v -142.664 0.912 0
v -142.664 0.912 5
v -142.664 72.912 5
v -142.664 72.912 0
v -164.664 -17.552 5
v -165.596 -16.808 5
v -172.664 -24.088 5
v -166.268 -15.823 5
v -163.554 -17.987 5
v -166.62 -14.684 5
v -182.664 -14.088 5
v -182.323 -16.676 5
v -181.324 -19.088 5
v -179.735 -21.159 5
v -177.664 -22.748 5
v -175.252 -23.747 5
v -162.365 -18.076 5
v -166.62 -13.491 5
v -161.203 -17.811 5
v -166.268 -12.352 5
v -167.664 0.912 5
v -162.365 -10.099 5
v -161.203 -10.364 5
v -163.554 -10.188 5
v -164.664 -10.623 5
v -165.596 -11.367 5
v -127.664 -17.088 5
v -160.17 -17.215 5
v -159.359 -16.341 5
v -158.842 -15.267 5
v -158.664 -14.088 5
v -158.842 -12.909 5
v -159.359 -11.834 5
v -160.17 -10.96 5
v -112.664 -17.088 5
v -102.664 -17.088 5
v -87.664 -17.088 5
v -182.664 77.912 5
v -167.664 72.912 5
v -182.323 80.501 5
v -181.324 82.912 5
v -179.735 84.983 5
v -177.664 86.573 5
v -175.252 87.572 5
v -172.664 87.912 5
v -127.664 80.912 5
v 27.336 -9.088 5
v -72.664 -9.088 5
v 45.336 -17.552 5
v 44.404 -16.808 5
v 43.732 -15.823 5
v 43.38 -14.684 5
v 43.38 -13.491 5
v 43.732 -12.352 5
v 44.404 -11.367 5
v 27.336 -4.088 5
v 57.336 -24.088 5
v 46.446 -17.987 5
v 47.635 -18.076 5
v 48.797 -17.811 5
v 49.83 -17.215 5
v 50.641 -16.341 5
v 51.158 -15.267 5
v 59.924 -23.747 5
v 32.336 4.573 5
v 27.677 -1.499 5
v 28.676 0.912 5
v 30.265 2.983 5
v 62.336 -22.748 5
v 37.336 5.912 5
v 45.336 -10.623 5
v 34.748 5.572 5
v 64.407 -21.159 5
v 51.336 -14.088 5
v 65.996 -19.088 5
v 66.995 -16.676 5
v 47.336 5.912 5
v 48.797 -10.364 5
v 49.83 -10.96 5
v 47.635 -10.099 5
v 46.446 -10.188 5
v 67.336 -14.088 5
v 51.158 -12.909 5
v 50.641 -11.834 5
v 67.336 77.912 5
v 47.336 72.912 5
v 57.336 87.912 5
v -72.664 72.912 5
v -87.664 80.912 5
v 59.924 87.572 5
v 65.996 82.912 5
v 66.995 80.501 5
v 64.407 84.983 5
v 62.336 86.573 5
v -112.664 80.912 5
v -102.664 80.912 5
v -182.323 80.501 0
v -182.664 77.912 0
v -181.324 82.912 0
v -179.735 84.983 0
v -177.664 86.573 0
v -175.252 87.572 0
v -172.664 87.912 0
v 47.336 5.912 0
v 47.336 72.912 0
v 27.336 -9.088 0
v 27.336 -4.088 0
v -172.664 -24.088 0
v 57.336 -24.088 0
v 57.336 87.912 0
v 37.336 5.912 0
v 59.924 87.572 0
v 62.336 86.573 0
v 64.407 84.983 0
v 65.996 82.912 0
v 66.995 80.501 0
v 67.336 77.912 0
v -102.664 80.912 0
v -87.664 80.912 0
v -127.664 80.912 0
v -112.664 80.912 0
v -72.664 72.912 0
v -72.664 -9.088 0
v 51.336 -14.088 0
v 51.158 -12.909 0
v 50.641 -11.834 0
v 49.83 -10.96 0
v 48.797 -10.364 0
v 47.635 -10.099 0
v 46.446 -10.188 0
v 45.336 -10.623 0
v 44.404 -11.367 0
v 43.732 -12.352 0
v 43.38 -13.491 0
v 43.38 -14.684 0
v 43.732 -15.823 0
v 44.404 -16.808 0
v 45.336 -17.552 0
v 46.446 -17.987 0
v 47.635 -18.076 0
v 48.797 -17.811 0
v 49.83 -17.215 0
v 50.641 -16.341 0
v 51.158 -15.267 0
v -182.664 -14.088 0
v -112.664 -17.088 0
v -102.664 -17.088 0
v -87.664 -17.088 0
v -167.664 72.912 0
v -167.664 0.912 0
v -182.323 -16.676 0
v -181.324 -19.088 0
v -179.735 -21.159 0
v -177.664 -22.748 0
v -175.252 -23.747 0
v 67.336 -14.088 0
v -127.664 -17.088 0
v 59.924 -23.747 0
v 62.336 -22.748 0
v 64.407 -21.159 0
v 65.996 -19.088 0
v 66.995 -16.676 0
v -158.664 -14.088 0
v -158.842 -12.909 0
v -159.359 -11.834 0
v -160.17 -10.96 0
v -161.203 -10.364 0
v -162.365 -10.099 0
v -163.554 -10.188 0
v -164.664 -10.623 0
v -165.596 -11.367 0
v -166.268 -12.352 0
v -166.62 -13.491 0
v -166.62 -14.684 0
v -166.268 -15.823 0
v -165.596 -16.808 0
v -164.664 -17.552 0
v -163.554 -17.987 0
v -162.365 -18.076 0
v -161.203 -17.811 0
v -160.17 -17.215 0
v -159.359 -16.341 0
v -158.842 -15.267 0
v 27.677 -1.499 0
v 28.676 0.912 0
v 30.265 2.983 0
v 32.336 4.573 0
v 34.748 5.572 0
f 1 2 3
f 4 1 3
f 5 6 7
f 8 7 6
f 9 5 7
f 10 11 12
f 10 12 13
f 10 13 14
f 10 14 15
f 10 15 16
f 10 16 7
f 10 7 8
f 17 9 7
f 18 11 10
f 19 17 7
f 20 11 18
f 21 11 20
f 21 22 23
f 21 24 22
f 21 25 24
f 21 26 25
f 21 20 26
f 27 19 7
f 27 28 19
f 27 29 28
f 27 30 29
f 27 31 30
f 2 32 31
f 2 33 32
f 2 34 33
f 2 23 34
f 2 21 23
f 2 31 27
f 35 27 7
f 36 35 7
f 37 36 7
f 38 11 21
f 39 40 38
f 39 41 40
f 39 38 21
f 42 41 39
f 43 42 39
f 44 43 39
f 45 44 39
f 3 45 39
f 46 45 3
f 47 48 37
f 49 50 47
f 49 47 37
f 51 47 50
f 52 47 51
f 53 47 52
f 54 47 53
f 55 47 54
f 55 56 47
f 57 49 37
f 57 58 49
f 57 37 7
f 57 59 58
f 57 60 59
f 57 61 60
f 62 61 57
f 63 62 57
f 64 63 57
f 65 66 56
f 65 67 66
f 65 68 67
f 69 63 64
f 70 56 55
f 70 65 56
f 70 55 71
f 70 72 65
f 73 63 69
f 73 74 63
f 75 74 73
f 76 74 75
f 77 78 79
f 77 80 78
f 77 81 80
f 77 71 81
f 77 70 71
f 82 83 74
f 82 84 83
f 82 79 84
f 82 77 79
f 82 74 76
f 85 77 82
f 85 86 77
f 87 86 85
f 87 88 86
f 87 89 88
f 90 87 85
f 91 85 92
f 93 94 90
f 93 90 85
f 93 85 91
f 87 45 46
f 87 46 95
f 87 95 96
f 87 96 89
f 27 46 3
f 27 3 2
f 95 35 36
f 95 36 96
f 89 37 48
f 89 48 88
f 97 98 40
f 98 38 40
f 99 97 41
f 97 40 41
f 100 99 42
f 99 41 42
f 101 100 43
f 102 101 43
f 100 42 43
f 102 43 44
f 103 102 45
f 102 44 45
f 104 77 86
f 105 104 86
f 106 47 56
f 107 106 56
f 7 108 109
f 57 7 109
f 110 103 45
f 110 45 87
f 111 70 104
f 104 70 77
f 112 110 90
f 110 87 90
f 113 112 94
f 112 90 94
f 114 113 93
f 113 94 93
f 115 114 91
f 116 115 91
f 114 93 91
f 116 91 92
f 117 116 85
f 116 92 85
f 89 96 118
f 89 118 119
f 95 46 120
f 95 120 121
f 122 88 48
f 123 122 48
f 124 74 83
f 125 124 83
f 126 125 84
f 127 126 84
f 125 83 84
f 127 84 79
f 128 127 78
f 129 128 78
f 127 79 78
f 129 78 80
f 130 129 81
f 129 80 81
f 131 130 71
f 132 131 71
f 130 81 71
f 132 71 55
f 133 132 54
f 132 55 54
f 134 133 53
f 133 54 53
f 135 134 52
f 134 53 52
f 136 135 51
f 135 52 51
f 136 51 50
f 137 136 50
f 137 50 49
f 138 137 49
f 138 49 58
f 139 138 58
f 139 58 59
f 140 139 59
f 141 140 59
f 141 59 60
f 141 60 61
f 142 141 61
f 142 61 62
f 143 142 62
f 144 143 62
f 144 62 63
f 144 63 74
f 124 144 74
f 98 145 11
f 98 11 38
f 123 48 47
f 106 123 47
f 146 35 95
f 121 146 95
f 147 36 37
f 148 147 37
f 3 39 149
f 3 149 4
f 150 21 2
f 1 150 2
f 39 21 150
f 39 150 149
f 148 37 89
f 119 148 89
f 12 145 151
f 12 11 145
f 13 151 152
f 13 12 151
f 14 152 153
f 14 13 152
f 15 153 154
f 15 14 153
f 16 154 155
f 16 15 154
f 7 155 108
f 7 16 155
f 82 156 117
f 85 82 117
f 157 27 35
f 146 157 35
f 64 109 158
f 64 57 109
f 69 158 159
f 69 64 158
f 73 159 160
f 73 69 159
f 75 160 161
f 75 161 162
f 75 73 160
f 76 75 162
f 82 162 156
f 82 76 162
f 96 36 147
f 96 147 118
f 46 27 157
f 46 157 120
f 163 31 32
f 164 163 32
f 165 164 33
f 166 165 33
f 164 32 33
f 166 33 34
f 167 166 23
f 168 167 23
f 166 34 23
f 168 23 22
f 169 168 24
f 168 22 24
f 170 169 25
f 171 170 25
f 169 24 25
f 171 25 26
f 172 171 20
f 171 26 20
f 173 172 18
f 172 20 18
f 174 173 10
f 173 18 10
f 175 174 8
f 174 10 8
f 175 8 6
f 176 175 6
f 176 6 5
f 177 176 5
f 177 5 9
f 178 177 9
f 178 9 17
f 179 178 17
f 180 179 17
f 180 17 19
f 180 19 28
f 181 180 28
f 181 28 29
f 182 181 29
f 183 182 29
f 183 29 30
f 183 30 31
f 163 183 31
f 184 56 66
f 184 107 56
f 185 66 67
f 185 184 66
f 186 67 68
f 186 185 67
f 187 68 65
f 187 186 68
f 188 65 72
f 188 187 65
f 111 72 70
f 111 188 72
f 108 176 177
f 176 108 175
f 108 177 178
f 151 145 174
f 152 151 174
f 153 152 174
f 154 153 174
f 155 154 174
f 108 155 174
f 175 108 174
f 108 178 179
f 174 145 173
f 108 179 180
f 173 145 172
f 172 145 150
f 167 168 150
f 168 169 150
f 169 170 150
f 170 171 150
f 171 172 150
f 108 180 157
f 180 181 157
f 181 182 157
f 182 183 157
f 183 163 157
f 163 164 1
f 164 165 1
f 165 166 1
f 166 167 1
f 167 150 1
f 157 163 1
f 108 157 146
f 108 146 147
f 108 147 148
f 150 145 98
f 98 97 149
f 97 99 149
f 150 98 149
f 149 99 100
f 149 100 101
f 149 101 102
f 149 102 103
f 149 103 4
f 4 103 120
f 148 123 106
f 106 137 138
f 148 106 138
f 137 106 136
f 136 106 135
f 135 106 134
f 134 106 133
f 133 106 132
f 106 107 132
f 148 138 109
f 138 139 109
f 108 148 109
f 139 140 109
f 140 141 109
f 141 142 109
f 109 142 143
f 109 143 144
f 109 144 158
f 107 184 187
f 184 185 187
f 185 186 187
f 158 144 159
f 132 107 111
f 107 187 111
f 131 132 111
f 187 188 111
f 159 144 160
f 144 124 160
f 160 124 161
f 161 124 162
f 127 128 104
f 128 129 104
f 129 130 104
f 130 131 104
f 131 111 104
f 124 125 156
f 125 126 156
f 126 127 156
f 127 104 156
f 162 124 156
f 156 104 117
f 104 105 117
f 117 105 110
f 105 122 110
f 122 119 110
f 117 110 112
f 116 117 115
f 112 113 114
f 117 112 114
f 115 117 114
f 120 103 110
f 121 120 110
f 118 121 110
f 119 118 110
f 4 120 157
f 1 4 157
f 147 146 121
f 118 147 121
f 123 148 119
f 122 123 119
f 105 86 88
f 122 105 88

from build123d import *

# Parameters (mm, degrees)
SKETCH1_W           = 250
SKETCH1_H           = 112
BOSS_EXTRUDE1_DEPTH = 5
SKETCH2_R           = 4
CUT_EXTRUDE1_DEPTH  = 11
SKETCH3_R           = 4
CUT_EXTRUDE2_DEPTH  = 15
SKETCH4_W           = 15
SKETCH4_H           = 98
CUT_EXTRUDE4_DEPTH  = 15
CUT_EXTRUDE5_DEPTH  = 15
FILLET1_R           = 10
SKETCH6_W           = 25
SKETCH6_H           = 72
CUT_EXTRUDE6_DEPTH  = 5


with BuildPart() as part:
    # Sketch1 → Boss-Extrude1 (new body)
    with BuildSketch(Plane.XY):
        with Locations((-57.664233577, 31.912408759)):
            Rectangle(SKETCH1_W, SKETCH1_H)
    extrude(amount=BOSS_EXTRUDE1_DEPTH)

    # Sketch2 → Cut-Extrude1 (cut)
    with BuildSketch(Plane.XY.offset(5)):
        with Locations((-162.664233577, -14.087591241)):
            Circle(SKETCH2_R)
    extrude(amount=-CUT_EXTRUDE1_DEPTH, mode=Mode.SUBTRACT)

    # Sketch3 → Cut-Extrude2 (cut)
    with BuildSketch(Plane.XY.offset(5)):
        with Locations((47.335766423, -14.087591241)):
            Circle(SKETCH3_R)
    extrude(amount=-CUT_EXTRUDE2_DEPTH, mode=Mode.SUBTRACT)

    # Sketch4 → Cut-Extrude4 (cut)
    with BuildSketch(Plane.XY.offset(5)):
        with Locations((-120.164233577, 31.912408759)):
            Rectangle(SKETCH4_W, SKETCH4_H)
        with Locations((-95.164233577, 31.912408759)):
            Rectangle(SKETCH4_W, SKETCH4_H)
    extrude(amount=-CUT_EXTRUDE4_DEPTH, mode=Mode.SUBTRACT)

    # Sketch5 → Cut-Extrude5 (cut)
    with BuildSketch(Plane.XY.offset(5)):
        Polygon((17.397729683, 72.912408759), (-72.664233577, 72.912408759), (-72.664233577, -9.087591241), (27.335766423, -9.087591241), (27.335766423, 5.912408759), (47.335766423, 5.912408759), (47.335766423, 72.912408759), align=None)
    extrude(amount=-CUT_EXTRUDE5_DEPTH, mode=Mode.SUBTRACT)

    # Fillet1
    fillet1_edges = [part.edges().sort_by_distance(p)[0] for p in [
        (27.335766423, 5.912408759, 2.5),
        (-182.664233577, 87.912408759, 2.5),
        (67.335766423, 87.912408759, 2.5),
        (67.335766423, -24.087591241, 2.5),
        (-182.664233577, -24.087591241, 2.5),
    ]]
    fillet(fillet1_edges, radius=FILLET1_R)

    # Sketch6 → Cut-Extrude6 (cut)
    with BuildSketch(Plane.XY.offset(5)):
        with Locations((-155.164233577, 36.912408759)):
            Rectangle(SKETCH6_W, SKETCH6_H)
    extrude(amount=-CUT_EXTRUDE6_DEPTH, mode=Mode.SUBTRACT)


solid = part.part
